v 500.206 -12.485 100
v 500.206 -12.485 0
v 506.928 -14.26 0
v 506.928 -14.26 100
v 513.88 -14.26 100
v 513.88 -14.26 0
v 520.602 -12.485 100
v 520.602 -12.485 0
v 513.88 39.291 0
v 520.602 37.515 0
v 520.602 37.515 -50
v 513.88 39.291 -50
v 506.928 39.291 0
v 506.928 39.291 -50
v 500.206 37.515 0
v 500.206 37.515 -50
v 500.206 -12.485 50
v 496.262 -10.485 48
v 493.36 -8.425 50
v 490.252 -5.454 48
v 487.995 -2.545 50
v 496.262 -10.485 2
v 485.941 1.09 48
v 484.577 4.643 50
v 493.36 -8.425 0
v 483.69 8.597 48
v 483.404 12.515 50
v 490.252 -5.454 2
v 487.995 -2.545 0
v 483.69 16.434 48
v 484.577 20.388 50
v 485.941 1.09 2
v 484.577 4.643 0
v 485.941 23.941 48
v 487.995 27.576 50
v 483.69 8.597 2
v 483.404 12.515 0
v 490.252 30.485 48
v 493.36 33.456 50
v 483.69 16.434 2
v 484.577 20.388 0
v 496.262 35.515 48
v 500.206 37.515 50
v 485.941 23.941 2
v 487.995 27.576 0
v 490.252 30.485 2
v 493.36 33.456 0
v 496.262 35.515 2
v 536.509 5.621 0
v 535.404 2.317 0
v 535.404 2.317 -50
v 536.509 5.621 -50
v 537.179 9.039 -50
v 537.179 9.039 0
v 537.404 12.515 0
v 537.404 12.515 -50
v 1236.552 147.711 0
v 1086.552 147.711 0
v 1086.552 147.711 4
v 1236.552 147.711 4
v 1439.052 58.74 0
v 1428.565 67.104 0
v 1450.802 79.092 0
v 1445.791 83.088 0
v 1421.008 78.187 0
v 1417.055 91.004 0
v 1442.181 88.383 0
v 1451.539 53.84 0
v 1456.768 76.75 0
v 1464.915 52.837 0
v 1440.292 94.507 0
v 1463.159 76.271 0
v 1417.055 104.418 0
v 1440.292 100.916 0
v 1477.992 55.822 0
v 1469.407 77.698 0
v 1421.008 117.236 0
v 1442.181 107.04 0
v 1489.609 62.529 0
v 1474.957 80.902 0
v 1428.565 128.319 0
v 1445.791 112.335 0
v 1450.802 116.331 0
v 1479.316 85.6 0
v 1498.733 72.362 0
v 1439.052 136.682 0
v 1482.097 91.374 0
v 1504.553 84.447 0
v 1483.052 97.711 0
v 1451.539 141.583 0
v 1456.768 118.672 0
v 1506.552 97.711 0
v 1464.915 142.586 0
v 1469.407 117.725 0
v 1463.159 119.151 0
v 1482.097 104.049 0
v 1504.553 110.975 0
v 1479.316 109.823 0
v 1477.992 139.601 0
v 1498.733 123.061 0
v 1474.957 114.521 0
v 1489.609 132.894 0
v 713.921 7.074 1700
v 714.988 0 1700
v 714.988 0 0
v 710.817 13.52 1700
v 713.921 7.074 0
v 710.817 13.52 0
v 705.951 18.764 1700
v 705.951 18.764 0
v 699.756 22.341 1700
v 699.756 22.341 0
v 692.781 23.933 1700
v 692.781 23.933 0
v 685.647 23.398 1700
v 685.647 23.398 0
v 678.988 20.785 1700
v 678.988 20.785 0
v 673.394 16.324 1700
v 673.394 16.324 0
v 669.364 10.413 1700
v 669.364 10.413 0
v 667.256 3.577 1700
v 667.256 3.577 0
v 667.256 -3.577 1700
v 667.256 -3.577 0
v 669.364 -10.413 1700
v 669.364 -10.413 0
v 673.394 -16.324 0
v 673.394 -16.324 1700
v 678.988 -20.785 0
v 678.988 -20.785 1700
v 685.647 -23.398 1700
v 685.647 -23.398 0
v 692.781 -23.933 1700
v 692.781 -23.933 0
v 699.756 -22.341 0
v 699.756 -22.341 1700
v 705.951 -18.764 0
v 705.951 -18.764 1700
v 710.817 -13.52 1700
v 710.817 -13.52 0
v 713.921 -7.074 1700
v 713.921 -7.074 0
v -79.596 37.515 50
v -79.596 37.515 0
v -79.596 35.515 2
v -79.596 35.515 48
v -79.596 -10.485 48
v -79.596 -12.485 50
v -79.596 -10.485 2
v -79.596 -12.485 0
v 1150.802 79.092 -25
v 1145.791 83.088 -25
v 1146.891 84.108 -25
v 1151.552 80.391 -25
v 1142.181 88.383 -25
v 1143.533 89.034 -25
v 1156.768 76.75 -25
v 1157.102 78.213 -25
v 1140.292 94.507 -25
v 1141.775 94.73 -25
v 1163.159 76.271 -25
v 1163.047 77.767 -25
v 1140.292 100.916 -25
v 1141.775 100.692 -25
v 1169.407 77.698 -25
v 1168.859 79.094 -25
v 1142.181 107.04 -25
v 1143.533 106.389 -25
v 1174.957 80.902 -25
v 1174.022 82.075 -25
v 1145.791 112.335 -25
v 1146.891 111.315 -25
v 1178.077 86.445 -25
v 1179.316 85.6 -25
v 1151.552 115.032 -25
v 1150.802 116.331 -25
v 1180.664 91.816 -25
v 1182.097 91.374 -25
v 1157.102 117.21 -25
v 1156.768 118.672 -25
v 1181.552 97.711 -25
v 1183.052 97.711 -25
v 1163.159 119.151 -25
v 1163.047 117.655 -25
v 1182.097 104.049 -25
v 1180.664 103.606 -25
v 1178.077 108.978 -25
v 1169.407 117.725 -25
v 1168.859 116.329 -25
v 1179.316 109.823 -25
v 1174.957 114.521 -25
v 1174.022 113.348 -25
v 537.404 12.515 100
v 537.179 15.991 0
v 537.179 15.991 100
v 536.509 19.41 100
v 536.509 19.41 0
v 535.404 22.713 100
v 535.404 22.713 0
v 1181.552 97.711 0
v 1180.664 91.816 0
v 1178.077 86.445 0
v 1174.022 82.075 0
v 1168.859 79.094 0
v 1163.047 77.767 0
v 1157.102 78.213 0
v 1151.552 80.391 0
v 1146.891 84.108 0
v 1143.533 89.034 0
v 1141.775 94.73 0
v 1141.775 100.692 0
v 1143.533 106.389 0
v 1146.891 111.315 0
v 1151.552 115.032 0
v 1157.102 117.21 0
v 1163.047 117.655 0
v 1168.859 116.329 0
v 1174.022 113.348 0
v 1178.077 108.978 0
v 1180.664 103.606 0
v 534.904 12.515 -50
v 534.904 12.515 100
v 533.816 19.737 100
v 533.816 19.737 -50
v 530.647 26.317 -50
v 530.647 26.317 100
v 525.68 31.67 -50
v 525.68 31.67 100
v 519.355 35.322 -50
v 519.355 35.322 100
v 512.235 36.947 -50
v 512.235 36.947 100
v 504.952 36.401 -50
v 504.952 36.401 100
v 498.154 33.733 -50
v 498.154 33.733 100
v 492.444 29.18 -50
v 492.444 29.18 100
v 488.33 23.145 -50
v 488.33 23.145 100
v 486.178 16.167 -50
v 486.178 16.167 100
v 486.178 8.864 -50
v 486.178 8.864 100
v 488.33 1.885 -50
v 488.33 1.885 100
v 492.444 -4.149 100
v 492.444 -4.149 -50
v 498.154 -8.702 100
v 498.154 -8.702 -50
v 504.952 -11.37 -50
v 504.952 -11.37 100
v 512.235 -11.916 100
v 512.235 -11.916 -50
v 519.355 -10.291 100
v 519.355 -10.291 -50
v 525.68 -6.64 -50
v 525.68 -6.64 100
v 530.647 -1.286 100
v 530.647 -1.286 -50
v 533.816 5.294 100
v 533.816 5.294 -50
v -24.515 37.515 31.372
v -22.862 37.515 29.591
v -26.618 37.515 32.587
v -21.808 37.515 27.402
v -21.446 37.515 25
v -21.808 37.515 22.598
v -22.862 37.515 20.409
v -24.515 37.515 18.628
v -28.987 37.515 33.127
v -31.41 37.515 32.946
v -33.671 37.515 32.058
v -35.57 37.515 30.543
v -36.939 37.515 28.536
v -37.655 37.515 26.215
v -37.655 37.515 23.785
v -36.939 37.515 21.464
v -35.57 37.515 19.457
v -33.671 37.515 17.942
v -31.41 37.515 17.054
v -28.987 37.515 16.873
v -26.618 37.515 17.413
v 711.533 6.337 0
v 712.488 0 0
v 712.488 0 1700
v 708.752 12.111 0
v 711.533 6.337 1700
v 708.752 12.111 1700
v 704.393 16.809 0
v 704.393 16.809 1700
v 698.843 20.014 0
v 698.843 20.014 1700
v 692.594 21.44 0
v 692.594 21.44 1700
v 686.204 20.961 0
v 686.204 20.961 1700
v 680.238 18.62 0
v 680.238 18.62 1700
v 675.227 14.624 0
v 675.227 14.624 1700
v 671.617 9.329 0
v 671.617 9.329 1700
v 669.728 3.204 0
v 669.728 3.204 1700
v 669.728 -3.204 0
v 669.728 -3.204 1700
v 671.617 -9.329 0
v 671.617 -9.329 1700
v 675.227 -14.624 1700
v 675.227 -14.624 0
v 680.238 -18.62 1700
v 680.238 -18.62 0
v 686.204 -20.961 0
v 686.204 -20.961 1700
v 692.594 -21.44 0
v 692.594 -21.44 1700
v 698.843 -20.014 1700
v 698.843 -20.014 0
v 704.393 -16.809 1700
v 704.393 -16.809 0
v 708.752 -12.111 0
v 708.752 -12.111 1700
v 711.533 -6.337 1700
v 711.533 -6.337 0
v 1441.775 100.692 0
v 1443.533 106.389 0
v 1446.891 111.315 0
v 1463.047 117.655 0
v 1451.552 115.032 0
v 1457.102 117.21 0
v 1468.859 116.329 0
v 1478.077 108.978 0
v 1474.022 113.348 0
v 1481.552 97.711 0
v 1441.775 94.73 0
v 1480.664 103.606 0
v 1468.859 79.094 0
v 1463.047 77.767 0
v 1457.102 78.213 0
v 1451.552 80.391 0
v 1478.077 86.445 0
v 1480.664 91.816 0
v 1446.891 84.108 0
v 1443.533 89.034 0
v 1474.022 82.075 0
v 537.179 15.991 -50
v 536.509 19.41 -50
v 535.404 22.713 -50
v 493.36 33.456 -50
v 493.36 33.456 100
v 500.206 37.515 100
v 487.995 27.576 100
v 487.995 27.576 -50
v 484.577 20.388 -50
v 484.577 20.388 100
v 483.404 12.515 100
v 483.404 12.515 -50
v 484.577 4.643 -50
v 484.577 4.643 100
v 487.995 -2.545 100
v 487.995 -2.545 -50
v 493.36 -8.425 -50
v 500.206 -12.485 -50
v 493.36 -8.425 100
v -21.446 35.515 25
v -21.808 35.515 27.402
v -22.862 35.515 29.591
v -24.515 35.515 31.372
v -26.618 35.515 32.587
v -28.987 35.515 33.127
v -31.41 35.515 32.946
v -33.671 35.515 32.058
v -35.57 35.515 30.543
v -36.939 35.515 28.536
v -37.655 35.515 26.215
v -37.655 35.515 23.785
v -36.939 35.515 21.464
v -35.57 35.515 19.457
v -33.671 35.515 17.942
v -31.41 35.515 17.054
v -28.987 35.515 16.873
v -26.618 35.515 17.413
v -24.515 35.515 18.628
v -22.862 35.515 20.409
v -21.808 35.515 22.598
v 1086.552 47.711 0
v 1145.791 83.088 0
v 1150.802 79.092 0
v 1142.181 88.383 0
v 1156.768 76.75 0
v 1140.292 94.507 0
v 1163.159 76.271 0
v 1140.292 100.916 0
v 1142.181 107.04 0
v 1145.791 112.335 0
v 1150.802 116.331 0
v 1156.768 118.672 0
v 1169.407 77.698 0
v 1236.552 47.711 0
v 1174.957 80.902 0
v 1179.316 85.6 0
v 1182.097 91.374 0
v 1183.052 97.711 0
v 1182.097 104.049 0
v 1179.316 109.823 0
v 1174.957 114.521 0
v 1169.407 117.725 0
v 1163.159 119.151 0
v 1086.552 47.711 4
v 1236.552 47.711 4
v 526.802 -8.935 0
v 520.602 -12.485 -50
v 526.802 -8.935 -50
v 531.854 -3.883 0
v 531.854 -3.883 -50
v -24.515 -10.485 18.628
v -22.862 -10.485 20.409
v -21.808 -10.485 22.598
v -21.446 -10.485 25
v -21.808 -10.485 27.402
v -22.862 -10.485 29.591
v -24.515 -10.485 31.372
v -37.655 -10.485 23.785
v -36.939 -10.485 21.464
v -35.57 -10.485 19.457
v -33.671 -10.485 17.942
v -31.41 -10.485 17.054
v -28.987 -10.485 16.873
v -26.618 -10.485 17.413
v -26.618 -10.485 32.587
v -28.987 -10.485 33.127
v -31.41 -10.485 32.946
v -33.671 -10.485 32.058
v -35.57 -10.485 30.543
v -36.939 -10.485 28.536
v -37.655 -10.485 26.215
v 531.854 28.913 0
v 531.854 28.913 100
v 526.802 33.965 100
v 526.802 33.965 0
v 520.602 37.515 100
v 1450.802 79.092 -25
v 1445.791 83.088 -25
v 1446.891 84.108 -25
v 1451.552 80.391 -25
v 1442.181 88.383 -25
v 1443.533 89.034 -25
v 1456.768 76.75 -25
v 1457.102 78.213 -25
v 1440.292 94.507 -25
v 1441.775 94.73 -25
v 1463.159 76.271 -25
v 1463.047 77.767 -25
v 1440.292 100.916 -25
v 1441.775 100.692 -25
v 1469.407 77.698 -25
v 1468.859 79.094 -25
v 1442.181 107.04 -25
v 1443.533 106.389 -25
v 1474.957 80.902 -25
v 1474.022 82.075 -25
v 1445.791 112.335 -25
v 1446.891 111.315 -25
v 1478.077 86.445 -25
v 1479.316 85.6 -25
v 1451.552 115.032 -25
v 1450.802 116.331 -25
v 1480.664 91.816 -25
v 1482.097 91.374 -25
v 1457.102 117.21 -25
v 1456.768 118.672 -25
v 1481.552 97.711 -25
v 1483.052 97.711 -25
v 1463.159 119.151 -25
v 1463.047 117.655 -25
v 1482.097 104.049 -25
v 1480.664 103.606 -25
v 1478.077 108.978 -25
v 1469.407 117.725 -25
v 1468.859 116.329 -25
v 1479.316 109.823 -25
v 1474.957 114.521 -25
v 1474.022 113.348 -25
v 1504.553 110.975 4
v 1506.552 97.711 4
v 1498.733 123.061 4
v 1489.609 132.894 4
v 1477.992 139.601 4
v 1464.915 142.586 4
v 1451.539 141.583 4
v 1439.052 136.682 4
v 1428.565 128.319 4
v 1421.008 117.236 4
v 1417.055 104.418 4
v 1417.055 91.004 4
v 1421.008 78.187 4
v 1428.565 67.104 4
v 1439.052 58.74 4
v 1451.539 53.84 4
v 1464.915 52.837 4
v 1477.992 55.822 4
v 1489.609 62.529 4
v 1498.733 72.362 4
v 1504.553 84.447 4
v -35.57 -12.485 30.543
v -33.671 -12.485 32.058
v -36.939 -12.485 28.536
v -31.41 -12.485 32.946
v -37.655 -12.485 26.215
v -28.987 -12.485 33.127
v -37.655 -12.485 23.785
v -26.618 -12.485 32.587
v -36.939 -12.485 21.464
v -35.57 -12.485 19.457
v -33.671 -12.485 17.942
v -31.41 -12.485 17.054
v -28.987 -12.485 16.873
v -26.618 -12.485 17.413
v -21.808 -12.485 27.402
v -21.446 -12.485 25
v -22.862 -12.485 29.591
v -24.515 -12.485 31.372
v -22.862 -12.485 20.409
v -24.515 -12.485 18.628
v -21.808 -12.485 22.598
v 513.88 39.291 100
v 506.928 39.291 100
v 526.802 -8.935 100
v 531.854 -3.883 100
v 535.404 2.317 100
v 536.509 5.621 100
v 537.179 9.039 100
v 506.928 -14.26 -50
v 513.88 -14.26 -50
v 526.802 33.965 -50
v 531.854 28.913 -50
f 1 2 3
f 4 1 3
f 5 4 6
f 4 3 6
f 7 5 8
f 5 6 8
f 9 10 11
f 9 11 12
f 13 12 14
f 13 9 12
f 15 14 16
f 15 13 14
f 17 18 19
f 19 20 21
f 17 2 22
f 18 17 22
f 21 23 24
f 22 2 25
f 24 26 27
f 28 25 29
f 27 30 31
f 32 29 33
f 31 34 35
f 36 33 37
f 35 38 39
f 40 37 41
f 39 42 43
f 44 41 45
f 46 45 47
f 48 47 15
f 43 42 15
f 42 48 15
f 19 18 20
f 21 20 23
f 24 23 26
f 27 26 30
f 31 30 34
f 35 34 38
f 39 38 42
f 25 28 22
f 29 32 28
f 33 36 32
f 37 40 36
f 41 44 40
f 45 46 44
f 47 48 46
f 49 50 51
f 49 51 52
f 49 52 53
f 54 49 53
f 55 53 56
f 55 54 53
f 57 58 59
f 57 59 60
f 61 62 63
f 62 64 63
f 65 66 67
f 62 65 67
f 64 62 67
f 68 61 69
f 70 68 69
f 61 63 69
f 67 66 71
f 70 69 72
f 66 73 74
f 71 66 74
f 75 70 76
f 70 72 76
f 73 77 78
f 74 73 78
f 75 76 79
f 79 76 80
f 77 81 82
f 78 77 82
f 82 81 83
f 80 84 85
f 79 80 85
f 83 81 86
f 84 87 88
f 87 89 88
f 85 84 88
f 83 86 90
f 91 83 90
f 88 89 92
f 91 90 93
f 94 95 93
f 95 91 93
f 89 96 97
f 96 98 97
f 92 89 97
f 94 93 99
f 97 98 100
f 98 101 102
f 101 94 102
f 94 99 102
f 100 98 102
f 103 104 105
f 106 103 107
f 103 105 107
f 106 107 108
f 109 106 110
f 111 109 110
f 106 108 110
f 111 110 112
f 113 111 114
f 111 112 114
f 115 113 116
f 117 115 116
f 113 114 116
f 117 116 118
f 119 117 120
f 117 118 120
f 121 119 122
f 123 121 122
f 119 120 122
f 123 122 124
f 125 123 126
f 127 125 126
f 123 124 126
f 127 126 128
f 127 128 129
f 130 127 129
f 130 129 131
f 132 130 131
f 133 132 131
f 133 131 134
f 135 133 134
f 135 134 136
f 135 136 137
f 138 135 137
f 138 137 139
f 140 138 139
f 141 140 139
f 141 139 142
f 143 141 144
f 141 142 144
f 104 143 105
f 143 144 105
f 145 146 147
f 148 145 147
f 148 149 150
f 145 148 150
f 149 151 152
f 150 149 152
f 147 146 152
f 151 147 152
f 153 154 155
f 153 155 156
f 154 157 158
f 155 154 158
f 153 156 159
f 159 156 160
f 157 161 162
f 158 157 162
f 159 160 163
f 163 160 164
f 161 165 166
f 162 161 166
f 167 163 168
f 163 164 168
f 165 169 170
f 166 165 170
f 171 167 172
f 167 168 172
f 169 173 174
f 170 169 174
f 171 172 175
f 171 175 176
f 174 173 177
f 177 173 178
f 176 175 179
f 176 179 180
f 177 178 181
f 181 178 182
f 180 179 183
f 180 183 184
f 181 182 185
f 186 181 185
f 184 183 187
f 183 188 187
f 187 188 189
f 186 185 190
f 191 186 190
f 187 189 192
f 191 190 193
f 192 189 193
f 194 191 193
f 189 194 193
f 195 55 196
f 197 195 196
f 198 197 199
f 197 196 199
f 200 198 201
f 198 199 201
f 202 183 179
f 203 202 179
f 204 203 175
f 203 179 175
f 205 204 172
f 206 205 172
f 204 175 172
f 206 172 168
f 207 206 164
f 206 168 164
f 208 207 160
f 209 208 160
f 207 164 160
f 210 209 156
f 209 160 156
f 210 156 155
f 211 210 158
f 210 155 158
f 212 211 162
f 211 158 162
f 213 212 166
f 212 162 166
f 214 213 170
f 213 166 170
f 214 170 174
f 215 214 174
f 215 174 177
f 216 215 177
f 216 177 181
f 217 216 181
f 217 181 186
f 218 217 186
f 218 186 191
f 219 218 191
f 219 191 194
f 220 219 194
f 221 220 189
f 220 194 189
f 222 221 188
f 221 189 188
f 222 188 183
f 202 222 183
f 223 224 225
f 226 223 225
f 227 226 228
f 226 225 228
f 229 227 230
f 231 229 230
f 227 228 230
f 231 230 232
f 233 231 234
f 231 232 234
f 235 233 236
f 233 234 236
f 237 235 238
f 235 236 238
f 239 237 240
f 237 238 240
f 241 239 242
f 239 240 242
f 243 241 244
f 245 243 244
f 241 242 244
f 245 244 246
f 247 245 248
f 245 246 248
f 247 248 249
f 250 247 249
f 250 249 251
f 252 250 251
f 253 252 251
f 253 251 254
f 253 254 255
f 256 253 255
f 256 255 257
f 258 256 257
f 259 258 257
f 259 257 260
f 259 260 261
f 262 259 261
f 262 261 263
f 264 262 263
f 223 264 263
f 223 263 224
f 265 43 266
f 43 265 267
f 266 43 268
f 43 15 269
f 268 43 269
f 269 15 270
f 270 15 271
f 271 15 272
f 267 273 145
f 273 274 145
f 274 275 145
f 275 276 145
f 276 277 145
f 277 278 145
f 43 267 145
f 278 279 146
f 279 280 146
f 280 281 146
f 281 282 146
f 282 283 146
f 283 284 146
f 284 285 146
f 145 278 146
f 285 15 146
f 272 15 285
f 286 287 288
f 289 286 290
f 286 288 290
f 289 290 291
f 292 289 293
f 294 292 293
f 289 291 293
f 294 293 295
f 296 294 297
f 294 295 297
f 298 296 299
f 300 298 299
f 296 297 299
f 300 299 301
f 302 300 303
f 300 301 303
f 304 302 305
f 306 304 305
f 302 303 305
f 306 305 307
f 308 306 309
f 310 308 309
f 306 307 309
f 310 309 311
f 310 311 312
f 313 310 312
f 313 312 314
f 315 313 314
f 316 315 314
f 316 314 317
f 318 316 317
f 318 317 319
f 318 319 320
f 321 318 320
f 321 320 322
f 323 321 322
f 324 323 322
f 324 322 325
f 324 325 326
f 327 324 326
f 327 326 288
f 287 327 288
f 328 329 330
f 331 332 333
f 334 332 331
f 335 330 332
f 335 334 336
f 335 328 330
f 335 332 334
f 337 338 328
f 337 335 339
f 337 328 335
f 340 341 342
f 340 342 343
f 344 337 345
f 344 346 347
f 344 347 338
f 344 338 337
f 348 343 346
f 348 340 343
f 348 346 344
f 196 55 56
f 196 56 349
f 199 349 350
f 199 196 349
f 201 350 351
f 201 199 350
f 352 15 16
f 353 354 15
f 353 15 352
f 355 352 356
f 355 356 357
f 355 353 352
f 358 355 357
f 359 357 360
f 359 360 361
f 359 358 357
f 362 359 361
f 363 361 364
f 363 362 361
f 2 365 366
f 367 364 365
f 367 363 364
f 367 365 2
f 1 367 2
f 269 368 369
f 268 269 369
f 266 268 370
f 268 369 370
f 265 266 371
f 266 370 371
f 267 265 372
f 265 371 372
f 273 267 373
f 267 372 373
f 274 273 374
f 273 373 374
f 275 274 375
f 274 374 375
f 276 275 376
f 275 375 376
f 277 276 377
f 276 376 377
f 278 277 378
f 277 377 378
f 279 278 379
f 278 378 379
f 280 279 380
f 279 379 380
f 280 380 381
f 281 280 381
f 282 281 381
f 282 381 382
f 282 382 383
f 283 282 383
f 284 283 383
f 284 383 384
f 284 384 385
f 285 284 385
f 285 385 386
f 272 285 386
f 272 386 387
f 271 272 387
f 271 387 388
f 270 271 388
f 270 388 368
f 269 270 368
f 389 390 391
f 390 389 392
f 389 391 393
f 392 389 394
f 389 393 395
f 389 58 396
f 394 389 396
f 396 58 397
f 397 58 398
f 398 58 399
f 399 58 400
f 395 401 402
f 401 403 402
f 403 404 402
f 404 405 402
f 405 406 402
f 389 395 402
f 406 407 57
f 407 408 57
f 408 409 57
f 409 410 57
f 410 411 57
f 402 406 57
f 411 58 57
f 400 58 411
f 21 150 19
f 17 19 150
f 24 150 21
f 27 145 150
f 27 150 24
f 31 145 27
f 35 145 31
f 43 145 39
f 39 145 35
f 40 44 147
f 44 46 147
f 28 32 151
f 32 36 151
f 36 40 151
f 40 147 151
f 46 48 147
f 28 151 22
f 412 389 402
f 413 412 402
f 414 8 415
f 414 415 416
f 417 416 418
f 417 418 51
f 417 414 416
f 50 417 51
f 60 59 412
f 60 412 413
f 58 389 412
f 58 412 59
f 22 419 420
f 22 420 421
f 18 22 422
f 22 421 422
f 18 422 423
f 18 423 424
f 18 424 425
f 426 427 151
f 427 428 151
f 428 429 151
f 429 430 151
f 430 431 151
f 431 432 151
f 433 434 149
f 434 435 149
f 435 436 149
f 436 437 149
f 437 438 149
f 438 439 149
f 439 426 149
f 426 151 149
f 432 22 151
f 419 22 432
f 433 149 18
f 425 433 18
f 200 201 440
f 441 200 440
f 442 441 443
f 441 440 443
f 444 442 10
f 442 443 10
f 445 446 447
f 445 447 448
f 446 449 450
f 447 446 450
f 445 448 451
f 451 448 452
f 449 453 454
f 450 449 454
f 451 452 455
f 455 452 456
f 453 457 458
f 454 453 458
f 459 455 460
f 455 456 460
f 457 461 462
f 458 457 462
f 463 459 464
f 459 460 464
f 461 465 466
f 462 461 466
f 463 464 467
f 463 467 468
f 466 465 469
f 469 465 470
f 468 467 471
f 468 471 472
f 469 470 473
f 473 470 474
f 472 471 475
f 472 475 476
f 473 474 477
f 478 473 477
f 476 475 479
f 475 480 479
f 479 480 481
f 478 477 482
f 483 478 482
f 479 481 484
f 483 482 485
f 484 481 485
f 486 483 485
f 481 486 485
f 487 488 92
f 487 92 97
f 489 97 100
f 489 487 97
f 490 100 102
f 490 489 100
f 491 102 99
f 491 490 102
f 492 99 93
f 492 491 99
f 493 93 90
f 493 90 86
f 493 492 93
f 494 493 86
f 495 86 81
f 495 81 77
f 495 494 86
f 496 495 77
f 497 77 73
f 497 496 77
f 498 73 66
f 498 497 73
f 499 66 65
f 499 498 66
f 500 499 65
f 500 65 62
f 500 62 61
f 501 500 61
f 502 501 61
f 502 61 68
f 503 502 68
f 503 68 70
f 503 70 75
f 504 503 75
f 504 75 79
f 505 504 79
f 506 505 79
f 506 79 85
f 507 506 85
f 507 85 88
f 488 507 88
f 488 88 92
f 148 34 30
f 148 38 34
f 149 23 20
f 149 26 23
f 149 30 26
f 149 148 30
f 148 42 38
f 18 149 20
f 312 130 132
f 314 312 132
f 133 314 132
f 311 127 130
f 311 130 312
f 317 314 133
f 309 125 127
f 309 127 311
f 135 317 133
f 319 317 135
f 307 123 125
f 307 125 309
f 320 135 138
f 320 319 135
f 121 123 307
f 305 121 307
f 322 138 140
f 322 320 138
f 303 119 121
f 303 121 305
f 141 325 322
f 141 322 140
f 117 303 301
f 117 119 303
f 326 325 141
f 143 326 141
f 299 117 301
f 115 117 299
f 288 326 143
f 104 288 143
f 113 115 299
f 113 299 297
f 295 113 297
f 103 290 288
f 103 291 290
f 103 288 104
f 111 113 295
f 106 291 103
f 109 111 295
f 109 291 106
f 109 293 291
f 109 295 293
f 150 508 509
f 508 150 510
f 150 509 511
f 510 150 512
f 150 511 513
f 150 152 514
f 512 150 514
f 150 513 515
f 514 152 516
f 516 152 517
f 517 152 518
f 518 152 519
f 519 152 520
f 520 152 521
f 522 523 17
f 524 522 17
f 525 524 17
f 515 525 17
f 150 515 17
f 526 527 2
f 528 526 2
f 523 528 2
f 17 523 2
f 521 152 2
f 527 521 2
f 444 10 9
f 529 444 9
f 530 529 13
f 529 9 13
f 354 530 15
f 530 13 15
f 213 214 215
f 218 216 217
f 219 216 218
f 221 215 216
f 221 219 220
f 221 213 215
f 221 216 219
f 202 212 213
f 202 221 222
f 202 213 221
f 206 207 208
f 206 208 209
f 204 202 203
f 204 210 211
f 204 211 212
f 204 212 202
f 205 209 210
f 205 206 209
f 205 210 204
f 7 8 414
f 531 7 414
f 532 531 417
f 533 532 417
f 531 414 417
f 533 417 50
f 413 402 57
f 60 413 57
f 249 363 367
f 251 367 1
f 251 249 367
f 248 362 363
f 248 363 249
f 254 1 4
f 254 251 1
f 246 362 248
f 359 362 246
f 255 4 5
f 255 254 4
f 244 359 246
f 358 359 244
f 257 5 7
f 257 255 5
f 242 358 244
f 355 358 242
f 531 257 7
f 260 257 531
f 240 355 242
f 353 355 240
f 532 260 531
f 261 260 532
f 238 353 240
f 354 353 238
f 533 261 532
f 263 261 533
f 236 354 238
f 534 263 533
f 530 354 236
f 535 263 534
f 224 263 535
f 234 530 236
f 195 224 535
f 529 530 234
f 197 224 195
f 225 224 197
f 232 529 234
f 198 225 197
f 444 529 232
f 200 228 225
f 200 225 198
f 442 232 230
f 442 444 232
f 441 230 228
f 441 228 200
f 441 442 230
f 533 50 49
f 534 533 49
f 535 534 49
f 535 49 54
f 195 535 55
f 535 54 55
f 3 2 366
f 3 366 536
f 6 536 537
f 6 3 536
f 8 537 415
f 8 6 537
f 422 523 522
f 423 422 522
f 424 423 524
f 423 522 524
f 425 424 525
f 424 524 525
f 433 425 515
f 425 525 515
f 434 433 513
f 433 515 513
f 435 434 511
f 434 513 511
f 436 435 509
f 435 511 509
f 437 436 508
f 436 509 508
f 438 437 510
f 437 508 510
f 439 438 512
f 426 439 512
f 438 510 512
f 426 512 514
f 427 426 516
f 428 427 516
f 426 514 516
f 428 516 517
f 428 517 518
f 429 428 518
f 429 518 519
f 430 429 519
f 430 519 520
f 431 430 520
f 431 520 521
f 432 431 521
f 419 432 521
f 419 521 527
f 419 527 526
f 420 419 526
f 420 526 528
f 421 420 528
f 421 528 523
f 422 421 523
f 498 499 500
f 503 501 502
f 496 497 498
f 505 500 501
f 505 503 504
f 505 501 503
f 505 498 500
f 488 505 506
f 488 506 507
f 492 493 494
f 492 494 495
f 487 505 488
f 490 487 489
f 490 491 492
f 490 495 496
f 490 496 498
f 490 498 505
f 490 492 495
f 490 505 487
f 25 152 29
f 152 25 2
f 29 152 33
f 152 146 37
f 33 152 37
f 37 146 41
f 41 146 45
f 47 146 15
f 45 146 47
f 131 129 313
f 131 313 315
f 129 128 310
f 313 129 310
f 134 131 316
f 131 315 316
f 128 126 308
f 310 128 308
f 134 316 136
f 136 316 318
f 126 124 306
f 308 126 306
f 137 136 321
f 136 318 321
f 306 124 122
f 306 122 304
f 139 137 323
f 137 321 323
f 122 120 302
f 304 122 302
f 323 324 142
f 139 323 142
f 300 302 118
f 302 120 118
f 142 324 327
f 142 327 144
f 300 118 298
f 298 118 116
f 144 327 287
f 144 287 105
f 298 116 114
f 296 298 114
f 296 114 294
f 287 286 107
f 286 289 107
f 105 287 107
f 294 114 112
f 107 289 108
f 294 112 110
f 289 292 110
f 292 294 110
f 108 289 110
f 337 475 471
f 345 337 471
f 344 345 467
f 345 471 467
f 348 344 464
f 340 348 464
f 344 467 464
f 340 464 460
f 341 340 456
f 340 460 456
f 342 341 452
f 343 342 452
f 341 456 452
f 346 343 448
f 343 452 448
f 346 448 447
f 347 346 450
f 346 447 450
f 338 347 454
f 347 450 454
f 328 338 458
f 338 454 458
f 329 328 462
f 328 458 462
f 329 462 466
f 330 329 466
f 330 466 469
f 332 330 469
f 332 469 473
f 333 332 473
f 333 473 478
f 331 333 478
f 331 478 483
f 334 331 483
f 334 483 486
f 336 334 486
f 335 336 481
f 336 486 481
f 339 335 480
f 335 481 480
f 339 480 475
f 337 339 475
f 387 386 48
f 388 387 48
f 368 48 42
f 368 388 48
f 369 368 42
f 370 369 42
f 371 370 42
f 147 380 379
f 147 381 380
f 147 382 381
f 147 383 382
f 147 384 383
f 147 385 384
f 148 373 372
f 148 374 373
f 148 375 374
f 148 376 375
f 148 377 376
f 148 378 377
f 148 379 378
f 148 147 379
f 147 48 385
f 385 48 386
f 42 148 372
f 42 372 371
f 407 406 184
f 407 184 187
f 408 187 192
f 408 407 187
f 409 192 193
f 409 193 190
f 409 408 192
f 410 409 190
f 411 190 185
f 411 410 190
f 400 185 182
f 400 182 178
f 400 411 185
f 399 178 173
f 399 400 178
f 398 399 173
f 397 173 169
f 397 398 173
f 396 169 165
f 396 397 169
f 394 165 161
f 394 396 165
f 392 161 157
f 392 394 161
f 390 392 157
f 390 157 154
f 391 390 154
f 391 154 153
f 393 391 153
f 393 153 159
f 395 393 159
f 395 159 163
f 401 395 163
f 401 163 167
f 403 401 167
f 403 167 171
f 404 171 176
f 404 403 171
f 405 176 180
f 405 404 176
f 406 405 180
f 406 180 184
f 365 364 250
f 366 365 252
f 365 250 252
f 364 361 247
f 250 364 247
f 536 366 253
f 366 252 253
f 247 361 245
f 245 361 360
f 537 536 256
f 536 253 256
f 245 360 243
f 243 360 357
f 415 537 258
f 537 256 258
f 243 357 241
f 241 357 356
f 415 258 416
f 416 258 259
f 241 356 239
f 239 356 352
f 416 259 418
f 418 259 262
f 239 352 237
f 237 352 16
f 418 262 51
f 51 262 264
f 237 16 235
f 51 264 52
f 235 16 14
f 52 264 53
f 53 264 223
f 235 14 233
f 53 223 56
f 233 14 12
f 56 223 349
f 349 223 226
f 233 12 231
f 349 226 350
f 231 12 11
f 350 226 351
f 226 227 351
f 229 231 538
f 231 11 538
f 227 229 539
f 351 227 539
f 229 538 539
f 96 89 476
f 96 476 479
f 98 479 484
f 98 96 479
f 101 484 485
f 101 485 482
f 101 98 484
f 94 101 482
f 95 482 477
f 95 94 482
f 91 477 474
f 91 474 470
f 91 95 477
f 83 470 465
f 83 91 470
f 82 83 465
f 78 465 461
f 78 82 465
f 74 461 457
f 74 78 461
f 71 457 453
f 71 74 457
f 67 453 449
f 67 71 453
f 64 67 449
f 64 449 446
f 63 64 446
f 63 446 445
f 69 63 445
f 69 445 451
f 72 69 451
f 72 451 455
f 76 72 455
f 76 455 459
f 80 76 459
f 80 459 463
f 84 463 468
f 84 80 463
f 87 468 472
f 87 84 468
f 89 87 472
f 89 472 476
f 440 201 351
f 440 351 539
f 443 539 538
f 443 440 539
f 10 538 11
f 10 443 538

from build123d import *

# Parameters (mm, degrees)
F1_DEPTH      = 50
F2_R          = 8.15
F3_DEPTH      = 50.001
F4_DEPTH      = 100
F4_DEPTH_BACK = 50
F5_R          = 24.5
F6_DEPTH      = 150.001
F7_R          = 24
F8_DEPTH      = 1700
F9_R          = 21.5
F10_DEPTH     = 1750.001
F11_W         = 150
F11_H         = 100
F11_R         = 21.5
F12_DEPTH     = 4
F13_DEPTH     = 25
F14_R         = 20
F15_DEPTH     = 25
F17_W         = 150
F17_H         = 100
F17_R         = 45
F18_DEPTH     = 54.001
F19_W         = 46
F19_H         = 46
F20_DEPTH     = 1586.1490357498
F21_DEPTH     = 150.001


with BuildPart() as f1:
    # F0 (on Top) → F1 (new body)
    with BuildSketch(Plane.XY):
        with BuildLine():
            Line((500.2059729525, 37.515304536), (-79.5959880203, 37.515304536))
            Line((-79.5959880203, 37.515304536), (-79.5959880203, -12.484695464))
            Line((-79.5959880203, -12.484695464), (500.2059729525, -12.484695464))
            ThreePointArc((500.2059729525, -12.484695464), (483.4040119797, 12.515304536), (500.2059729525, 37.515304536))
        make_face()
    extrude(amount=F1_DEPTH)

    # F2 (on face) → F3 (cut, through all)
    with BuildSketch(Plane.XZ.offset(12.484695464)):
        with Locations((-29.5959880203, 25)):
            Circle(F2_R)
    extrude(amount=-F3_DEPTH, mode=Mode.SUBTRACT)

    # F19 (on face) → F20 (cut, through all)
    with BuildSketch(Plane(origin=(-79.5959880203, 0, 0), x_dir=(0, -1, 0), z_dir=(-1, 0, 0))):
        with Locations((-12.515304536, 25)):
            Rectangle(F19_W, F19_H)
    extrude(amount=-F20_DEPTH, mode=Mode.SUBTRACT)

    # F5 (on face) → F21 (cut, through all)
    with BuildSketch(Plane.XY.offset(100)):
        with Locations((510.4040119797, 12.515304536)):
            Circle(F5_R)
    extrude(amount=-F21_DEPTH, mode=Mode.SUBTRACT)


with BuildPart() as f4:
    # F0 (on Top) → F4 (new body, two sides)
    with BuildSketch(Plane.XY) as f4_sk:
        with BuildLine():
            Line((520.6020510069, 37.515304536), (500.2059729525, 37.515304536))
            ThreePointArc((500.2059729525, 37.515304536), (483.4040119797, 12.515304536), (500.2059729525, -12.484695464))
            Line((500.2059729525, -12.484695464), (520.6020510069, -12.484695464))
            ThreePointArc((520.6020510069, -12.484695464), (529.4958950717, -6.576578556), (535.4040119797, 2.3172655088))
            Line((535.4040119797, 2.3172655088), (535.4040119797, 22.7133435632))
            ThreePointArc((535.4040119797, 22.7133435632), (529.4958950717, 31.6071876281), (520.6020510069, 37.515304536))
        make_face()
        with BuildLine():
            Line((520.6020510069, -12.484695464), (500.2059729525, -12.484695464))
            ThreePointArc((500.2059729525, -12.484695464), (510.4040119797, -14.484695464), (520.6020510069, -12.484695464))
        make_face()
        with BuildLine():
            ThreePointArc((537.4040119797, 12.515304536), (536.8992945787, 17.7114569587), (535.4040119797, 22.7133435632))
            Line((535.4040119797, 22.7133435632), (535.4040119797, 2.3172655088))
            ThreePointArc((535.4040119797, 2.3172655088), (536.8992945787, 7.3191521133), (537.4040119797, 12.515304536))
        make_face()
        with BuildLine():
            ThreePointArc((520.6020510069, 37.515304536), (510.4040119797, 39.515304536), (500.2059729525, 37.515304536))
            Line((500.2059729525, 37.515304536), (520.6020510069, 37.515304536))
        make_face()
    extrude(amount=F4_DEPTH)
    extrude(f4_sk.sketch, amount=-F4_DEPTH_BACK)

    # F5 (on face) → F6 (cut, through all)
    with BuildSketch(Plane.XY.offset(100)):
        with Locations((510.4040119797, 12.515304536)):
            Circle(F5_R)
    extrude(amount=-F6_DEPTH, mode=Mode.SUBTRACT)


with BuildPart() as f8:
    # F7 (on Top) → F8 (new body)
    with BuildSketch(Plane.XY):
        with Locations((690.9877061844, 0)):
            Circle(F7_R)
    extrude(amount=F8_DEPTH)

    # F9 (on face) → F10 (cut, through all)
    with BuildSketch(Plane.XY.offset(1700)):
        with Locations((690.9877061844, 0)):
            Circle(F9_R)
    extrude(amount=-F10_DEPTH, mode=Mode.SUBTRACT)


with BuildPart() as f12:
    # F11 (on Top) → F12 (new body)
    with BuildSketch(Plane.XY):
        with Locations((1161.5520477295, 97.7113426873)):
            Rectangle(F11_W, F11_H)
        with Locations((1161.5520477295, 97.7113426873)):
            Circle(F11_R, mode=Mode.SUBTRACT)
        with Locations((1161.5520477295, 97.7113426873)):
            Circle(F11_R)
    extrude(amount=F12_DEPTH)

    # F11 (on Top) → F13 (join)
    with BuildSketch(Plane.XY):
        with Locations((1161.5520477295, 97.7113426873)):
            Circle(F11_R)
    extrude(amount=-F13_DEPTH)

    # F14 (on face) → F15 (cut)
    with BuildSketch(Plane(origin=(0, 0, -25), x_dir=(1, 0, 0), z_dir=(0, 0, -1))):
        with Locations((1161.5520477295, -97.7113426873)):
            Circle(F14_R)
    extrude(amount=-F15_DEPTH, mode=Mode.SUBTRACT)


with BuildPart() as f16_1:
    # F16: copy of F12
    add(f12.part.moved(Location((300, 0, 0))))

    # F17 (on face) → F18 (cut, through all)
    with BuildSketch(Plane.XY.offset(4)):
        with Locations((1461.5520477295, 97.7113426873)):
            Rectangle(F17_W, F17_H)
        with Locations((1461.5520477295, 97.7113426873)):
            Circle(F17_R, mode=Mode.SUBTRACT)
    extrude(amount=-F18_DEPTH, mode=Mode.SUBTRACT)


solid = Compound([f1.part, f4.part, f8.part, f12.part, f16_1.part])
